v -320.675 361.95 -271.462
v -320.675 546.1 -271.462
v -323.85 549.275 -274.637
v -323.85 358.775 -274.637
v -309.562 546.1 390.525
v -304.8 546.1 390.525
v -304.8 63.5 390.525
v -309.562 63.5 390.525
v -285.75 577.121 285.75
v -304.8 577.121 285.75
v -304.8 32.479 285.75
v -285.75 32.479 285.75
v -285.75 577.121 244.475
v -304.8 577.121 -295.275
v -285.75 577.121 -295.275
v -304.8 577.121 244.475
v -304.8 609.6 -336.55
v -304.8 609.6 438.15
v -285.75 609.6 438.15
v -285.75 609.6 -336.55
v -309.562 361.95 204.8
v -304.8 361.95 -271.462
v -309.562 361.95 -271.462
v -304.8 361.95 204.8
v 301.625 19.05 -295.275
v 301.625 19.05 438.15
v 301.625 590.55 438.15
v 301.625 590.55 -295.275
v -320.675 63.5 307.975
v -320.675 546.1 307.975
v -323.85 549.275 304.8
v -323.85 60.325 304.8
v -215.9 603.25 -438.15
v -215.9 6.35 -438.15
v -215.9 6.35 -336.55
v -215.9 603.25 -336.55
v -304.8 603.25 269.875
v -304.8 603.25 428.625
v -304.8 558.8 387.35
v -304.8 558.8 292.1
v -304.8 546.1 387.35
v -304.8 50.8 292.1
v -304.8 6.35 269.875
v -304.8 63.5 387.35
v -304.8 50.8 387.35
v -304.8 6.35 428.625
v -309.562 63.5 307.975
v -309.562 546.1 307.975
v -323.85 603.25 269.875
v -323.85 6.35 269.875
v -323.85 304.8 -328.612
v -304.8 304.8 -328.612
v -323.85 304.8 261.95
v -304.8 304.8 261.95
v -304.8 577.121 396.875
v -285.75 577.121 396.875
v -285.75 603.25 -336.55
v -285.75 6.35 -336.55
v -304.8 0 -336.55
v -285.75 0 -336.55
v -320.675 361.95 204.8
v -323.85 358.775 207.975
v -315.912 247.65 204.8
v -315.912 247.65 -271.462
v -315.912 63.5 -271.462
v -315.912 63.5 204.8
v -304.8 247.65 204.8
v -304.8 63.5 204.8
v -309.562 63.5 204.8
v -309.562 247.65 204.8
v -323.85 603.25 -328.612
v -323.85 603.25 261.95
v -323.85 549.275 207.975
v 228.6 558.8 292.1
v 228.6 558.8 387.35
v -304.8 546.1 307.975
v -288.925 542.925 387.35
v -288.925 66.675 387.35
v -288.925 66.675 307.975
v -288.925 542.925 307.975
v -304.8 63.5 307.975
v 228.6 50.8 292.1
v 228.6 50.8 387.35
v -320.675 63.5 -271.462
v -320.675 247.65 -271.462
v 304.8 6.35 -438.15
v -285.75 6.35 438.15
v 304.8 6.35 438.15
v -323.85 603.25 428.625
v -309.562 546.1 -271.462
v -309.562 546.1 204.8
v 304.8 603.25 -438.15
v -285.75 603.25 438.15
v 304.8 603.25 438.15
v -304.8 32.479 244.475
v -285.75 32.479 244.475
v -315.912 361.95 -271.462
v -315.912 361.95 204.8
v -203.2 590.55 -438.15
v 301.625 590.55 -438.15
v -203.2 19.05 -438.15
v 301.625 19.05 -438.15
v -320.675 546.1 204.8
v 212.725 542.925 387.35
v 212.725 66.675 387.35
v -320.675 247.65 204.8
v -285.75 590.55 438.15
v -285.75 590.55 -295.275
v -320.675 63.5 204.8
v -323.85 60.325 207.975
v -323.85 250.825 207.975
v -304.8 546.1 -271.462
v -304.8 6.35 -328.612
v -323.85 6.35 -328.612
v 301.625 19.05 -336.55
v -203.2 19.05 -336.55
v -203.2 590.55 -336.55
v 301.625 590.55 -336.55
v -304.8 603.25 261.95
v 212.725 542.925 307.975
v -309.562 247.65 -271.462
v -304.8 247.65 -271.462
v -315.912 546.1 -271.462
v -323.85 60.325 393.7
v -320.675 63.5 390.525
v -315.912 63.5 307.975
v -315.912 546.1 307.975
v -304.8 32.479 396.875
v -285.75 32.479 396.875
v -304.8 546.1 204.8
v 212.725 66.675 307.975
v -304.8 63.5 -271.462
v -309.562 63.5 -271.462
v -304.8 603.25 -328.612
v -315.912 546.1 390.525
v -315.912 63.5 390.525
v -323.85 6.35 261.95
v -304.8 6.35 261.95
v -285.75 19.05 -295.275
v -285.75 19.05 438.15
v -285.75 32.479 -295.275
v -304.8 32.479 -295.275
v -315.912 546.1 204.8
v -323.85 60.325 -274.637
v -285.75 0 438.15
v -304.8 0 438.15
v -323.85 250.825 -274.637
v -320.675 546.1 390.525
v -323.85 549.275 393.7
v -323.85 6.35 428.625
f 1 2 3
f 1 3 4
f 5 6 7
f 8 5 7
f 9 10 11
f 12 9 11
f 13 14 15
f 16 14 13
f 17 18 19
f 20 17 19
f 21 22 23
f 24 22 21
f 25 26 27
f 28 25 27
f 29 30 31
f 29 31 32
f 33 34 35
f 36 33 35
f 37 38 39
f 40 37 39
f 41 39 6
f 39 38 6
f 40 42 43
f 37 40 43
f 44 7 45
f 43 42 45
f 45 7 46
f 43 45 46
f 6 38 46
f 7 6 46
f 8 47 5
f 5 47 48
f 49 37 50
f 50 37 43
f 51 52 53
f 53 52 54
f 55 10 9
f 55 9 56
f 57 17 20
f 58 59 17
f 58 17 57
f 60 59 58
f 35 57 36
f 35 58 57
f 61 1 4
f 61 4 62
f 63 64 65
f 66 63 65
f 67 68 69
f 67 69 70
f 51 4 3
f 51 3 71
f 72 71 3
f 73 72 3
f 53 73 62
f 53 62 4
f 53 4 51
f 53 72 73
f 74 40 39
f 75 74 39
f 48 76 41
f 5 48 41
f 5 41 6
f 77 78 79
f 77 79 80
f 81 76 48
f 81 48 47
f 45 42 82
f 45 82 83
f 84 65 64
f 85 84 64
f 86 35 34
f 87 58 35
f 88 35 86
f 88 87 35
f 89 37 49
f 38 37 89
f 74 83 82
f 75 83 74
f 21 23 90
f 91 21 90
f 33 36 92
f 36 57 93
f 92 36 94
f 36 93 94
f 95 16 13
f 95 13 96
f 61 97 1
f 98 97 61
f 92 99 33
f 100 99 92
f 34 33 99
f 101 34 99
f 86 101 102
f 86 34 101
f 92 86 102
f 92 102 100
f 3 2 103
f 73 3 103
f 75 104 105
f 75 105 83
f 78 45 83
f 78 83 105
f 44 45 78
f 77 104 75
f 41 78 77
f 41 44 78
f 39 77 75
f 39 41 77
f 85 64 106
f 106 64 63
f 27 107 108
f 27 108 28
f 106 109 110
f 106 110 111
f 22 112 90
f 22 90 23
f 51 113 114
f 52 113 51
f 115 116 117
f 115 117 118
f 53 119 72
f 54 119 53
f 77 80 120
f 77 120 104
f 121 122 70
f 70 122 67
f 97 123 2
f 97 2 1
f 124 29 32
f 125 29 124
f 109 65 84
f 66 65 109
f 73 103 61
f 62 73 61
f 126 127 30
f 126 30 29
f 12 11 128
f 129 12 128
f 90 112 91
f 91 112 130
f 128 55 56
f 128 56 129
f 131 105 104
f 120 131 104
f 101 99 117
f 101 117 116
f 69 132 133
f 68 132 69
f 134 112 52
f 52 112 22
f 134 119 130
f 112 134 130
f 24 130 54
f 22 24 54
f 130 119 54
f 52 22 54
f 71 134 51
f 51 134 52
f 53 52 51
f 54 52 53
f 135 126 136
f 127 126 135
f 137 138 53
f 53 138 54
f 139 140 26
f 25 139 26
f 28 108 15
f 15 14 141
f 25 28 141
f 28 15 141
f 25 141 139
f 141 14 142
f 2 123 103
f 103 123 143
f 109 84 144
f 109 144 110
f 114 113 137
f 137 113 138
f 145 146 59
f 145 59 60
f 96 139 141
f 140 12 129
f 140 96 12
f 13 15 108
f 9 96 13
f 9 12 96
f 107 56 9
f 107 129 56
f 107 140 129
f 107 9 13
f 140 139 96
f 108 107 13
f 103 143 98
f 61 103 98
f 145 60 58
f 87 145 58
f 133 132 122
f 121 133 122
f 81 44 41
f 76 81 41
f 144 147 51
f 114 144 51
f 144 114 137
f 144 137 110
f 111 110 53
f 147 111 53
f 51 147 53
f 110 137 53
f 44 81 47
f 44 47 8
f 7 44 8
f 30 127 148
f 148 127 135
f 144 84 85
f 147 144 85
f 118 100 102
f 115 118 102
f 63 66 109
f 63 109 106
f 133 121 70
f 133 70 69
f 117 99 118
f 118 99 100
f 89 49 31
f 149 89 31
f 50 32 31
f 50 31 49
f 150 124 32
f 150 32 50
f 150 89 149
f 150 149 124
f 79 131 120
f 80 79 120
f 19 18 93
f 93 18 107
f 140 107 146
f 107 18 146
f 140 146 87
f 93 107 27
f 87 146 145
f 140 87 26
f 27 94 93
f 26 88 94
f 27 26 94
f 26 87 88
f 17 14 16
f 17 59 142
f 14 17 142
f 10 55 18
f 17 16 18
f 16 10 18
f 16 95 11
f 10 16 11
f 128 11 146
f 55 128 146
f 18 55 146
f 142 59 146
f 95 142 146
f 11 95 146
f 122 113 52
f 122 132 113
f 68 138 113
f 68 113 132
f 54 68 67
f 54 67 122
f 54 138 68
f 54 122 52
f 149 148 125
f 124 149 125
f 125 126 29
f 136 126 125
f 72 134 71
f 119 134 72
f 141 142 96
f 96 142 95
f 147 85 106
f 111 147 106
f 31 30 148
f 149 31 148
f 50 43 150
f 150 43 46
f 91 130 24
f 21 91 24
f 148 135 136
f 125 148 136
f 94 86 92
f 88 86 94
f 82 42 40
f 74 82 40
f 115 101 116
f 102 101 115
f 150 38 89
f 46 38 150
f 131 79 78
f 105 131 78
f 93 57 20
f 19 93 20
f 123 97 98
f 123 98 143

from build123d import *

# Parameters (mm, degrees)
F0_W          = 609.6
F0_H          = 876.3
F1_DEPTH      = 609.6
F2_W          = 88.9
F2_H          = 101.6
F3_DEPTH      = 609.601
F4_W          = 544.6426229508
F4_H          = 692.15
F5_DEPTH      = 19.05
F6_W          = 590.55
F6_H          = 6.35
F7_DEPTH      = 876.301
F8_W          = 587.375
F8_H          = 571.5
F9_DEPTH      = 733.425
F10_W         = 544.6426229508
F10_H         = 41.275
F11_DEPTH     = 19.05
F12_W         = 298.45
F12_H         = 590.5627
F12_W_2       = 184.15
F12_H_2       = 476.2627
F13_DEPTH     = 19.05
F14_W         = 6.35
F14_H         = 184.15
F15_DEPTH     = 476.2627
F16_SIZE      = 3.175
F17_W         = 596.9
F17_H         = 158.75
F17_W_2       = 482.6
F17_H_2       = 82.55
F18_DEPTH     = 19.05
F19_W         = 6.35
F19_H         = 482.6
F20_DEPTH     = 82.55
F21_SIZE      = 3.175
F22_W         = 504.825
F22_H         = 571.5
F23_DEPTH     = 101.6
F24_W         = 508
F24_H         = 95.25
F25_DEPTH     = 533.4
F26_T         = 15.875
F26_T3_DEPTH  = 37.249261314
F26_T5_DEPTH  = 37.249261314
F26_T7_DEPTH  = 37.249261314
F26_T9_DEPTH  = 37.249261314
F26_T11_DEPTH = 36.5125
F26_T13_DEPTH = 514.35
F26_T15_DEPTH = 114.3
F26_T17_DEPTH = 127
F26_T19_DEPTH = 539.75
F26_T21_DEPTH = 111.125
F26_T23_DEPTH = 36.5125


# Not quite as in the source:
# - a shell that OpenCascade refuses in one call is made with other operations: the cavity is built on its own and cut out


with BuildPart() as f1:
    # F0 (on Front) → F1 (new body)
    with BuildSketch(Plane.XZ):
        Rectangle(F0_W, F0_H)
    extrude(amount=-F1_DEPTH)

    # F2 (on face) → F3 (cut, through all)
    with BuildSketch(Plane.XZ):
        with Locations((-260.35, -387.35)):
            Rectangle(F2_W, F2_H)
    extrude(amount=-F3_DEPTH, mode=Mode.SUBTRACT)

    # F4 (on face) → F5 (cut)
    with BuildSketch(Plane(origin=(-304.8, 0, 0), x_dir=(0, -1, 0), z_dir=(-1, 0, 0))):
        with Locations((-304.8, 50.8)):
            Rectangle(F4_W, F4_H)
    extrude(amount=-F5_DEPTH, mode=Mode.SUBTRACT)

    # F6 (on face) → F7 (cut, through all)
    with BuildSketch(Plane.XY.offset(438.15)):
        with Locations((9.525, 606.425)):
            Rectangle(F6_W, F6_H)
        with Locations((9.525, 3.175)):
            Rectangle(F6_W, F6_H)
    extrude(amount=-F7_DEPTH, mode=Mode.SUBTRACT)

    # F8 (on face) → F9 (cut, through all)
    with BuildSketch(Plane.XY.offset(438.15)):
        with Locations((7.9375, 304.8)):
            Rectangle(F8_W, F8_H)
    extrude(amount=-F9_DEPTH, mode=Mode.SUBTRACT)

    # F10 (on face) → F11 (join, through all)
    with BuildSketch(Plane(origin=(-304.8, 0, 0), x_dir=(0, -1, 0), z_dir=(-1, 0, 0))):
        with Locations((-304.8, 265.1125)):
            Rectangle(F10_W, F10_H)
    extrude(amount=-F11_DEPTH)

    # F22 (on face) → F23 (cut)
    with BuildSketch(Plane(origin=(0, 0, -438.15), x_dir=(1, 0, 0), z_dir=(0, 0, -1))):
        with Locations((49.2125, -304.8)):
            Rectangle(F22_W, F22_H)
    extrude(amount=-F23_DEPTH, mode=Mode.SUBTRACT)


with BuildPart() as f13:
    # F12 (on face) → F13 (new body)
    with BuildSketch(Plane(origin=(-304.8, 0, 0), x_dir=(0, -1, 0), z_dir=(-1, 0, 0))):
        with Locations((-454.025, -33.33115)):
            Rectangle(F12_W, F12_H)
        with Locations((-454.025, -33.33115)):
            Rectangle(F12_W_2, F12_H_2, mode=Mode.SUBTRACT)
    extrude(amount=F13_DEPTH)

    # F14 (on face) → F15 (join, through all)
    with BuildSketch(Plane.XY.offset(-271.4625)):
        with Locations((-312.7375, 454.025)):
            Rectangle(F14_W, F14_H)
    extrude(amount=F15_DEPTH)

    # F16
    f16_edges = [f13.edges().sort_by_distance(p)[0] for p in [
        (-323.85, 546.1, -33.33115),
        (-323.85, 454.025, -271.4625),
        (-323.85, 361.95, -33.33115),
        (-323.85, 454.025, 204.8002),
    ]]
    chamfer(f16_edges, length=F16_SIZE)


with BuildPart() as f18:
    # F17 (on face) → F18 (new body)
    with BuildSketch(Plane(origin=(-304.8, 0, 0), x_dir=(0, -1, 0), z_dir=(-1, 0, 0))):
        with Locations((-304.8, 349.25)):
            Rectangle(F17_W, F17_H)
        with Locations((-304.8, 349.25)):
            Rectangle(F17_W_2, F17_H_2, mode=Mode.SUBTRACT)
    extrude(amount=F18_DEPTH)

    # F19 (on face) → F20 (join, through all)
    with BuildSketch(Plane.XY.offset(307.975)):
        with Locations((-312.7375, 304.8)):
            Rectangle(F19_W, F19_H)
    extrude(amount=F20_DEPTH)

    # F21
    f21_edges = [f18.edges().sort_by_distance(p)[0] for p in [
        (-323.85, 304.8, 307.975),
        (-323.85, 546.1, 349.25),
        (-323.85, 304.8, 390.525),
        (-323.85, 63.5, 349.25),
    ]]
    chamfer(f21_edges, length=F21_SIZE)

    # F24 (on face) → F25 (join)
    with BuildSketch(Plane.YZ.offset(-304.8)):
        with Locations((304.8, 339.725)):
            Rectangle(F24_W, F24_H)
    extrude(amount=F25_DEPTH)

    # F26: shell of thickness 15.875, made by hand


with BuildPart() as f26_core1:
    # F26_t2: copy of F18
    add(f18.part)

    # the walls: a layer under each face that stays
    f26_faces = [f26_core1.faces().sort_by_distance(p)[0] for p in [
        (-323.85, 503.7666666667, 296.3333333333),
        (-322.2625, 304.8, 306.3875),
        (-322.2625, 61.9125, 349.25),
        (-322.2625, 547.6875, 349.25),
        (-322.2625, 304.8, 392.1125),
        (-314.325, 304.8, 428.625),
        (-314.325, 603.25, 349.25),
        (-314.325, 304.8, 269.875),
        (-314.325, 6.35, 349.25),
        (-318.29375, 304.8, 307.975),
        (-318.29375, 63.5, 349.25),
        (-318.29375, 546.1, 349.25),
        (-318.29375, 304.8, 390.525),
        (-304.8, 503.7666666667, 402.1666666667),
        (-315.9125, 304.8, 349.25),
        (-38.1, 558.8, 339.725),
        (-38.1, 304.8, 292.1),
        (-38.1, 50.8, 339.725),
        (-307.18125, 63.5, 349.25),
        (-307.18125, 304.8, 390.525),
        (-307.18125, 546.1, 349.25),
        (-304.8, 304.8, 347.6625),
        (228.6, 304.8, 339.725),
        (-307.18125, 304.8, 307.975),
        (-309.5625, 304.8, 349.25),
    ]]
    thicken(f26_faces, amount=-F26_T, mode=Mode.SUBTRACT)

    # F26_s4 → F26_t3 (cut)
    with BuildSketch(Plane(origin=(4.5928978099, 4.5928978099, 4.5928978099), x_dir=(-0.7071067812, 0.7071067812, 0), z_dir=(0.5773502692, 0.5773502692, 0.5773502692))):
        Polygon((271.8908726623, 356.5892701441), (263.7152476623, 342.7036353262), (255.7777476623, 347.2863530879), (255.7777476623, 356.4517886113), align=None)
    extrude(amount=F26_T3_DEPTH, mode=Mode.SUBTRACT)

    # F26_s6 → F26_t5 (cut)
    with BuildSketch(Plane(origin=(-198.6071021901, 198.60710219, -198.6071021901), x_dir=(0.7071067812, 0.7071067812, 0), z_dir=(0.5773502692, -0.5773502692, 0.5773502692))):
        Polygon((159.161421149, 605.4574280109), (167.337046149, 591.571793193), (175.274546149, 596.1545109546), (175.274546149, 605.319946478), align=None)
    extrude(amount=F26_T5_DEPTH, mode=Mode.SUBTRACT)

    # F26_s8 → F26_t7 (cut)
    with BuildSketch(Plane(origin=(-228.2404355234, -228.2404355234, 228.2404355234), x_dir=(-0.7071067812, 0.7071067812, 0), z_dir=(0.5773502692, 0.5773502692, -0.5773502692))):
        Polygon((271.8908726623, 213.7335916339), (255.7777476623, 213.8710731668), (255.7777476623, 223.0365086901), (263.7152476623, 227.6192264518), align=None)
    extrude(amount=F26_T7_DEPTH, mode=Mode.SUBTRACT)

    # F26_s10 → F26_t9 (cut)
    with BuildSketch(Plane(origin=(-431.4404355234, 431.4404355234, 431.4404355234), x_dir=(0.7071067812, 0.7071067812, 0), z_dir=(0.5773502692, -0.5773502692, -0.5773502692))):
        Polygon((159.161421149, -35.1345662329), (175.274546149, -34.9970847), (175.274546149, -25.8316491766), (167.337046149, -21.2489314149), align=None)
    extrude(amount=F26_T9_DEPTH, mode=Mode.SUBTRACT)

    # F26_s12 → F26_t11 (cut)
    with BuildSketch(Plane.YZ.offset(-336.55)):
        Polygon((545.94125, 308.13375), (546.1, 292.1), (561.975, 292.1), (561.975, 307.975), align=None)
        Polygon((63.65875, 308.13375), (63.5, 292.1), (47.625, 292.1), (47.625, 307.975), align=None)
        Polygon((63.65875, 390.36625), (47.625, 390.525), (47.625, 406.4), (63.5, 406.4), align=None)
        Polygon((545.94125, 390.36625), (561.975, 390.525), (561.975, 406.4), (546.1, 406.4), align=None)
    extrude(amount=F26_T11_DEPTH, mode=Mode.SUBTRACT)

    # F26_s14 → F26_t13 (cut)
    with BuildSketch(Plane.XZ.offset(-561.975)):
        Polygon((-316.07125, 308.13375), (-315.9125, 292.1), (-300.0375, 292.1), (-300.0375, 307.975), align=None)
        Polygon((-316.07125, 390.36625), (-315.9125, 406.4), (-300.0375, 406.4), (-300.0375, 390.525), align=None)
        Polygon((-309.40375, 390.36625), (-309.5625, 406.4), (-325.4375, 406.4), (-325.4375, 390.525), align=None)
        Polygon((-304.95875, 308.13375), (-288.925, 307.975), (-288.925, 292.1), (-304.8, 292.1), align=None)
        Polygon((-309.40375, 308.13375), (-309.5625, 292.1), (-325.4375, 292.1), (-325.4375, 307.975), align=None)
    extrude(amount=F26_T13_DEPTH, mode=Mode.SUBTRACT)

    # F26_s16 → F26_t15 (cut)
    with BuildSketch(Plane.XY.offset(292.1)):
        Polygon((-316.07125, 63.65875), (-315.9125, 47.625), (-300.0375, 47.625), (-300.0375, 63.5), align=None)
        Polygon((-316.07125, 545.94125), (-315.9125, 561.975), (-300.0375, 561.975), (-300.0375, 546.1), align=None)
        Polygon((-309.40375, 63.65875), (-309.5625, 47.625), (-325.4375, 47.625), (-325.4375, 63.5), align=None)
        Polygon((-309.40375, 545.94125), (-309.5625, 561.975), (-325.4375, 561.975), (-325.4375, 546.1), align=None)
    extrude(amount=F26_T15_DEPTH, mode=Mode.SUBTRACT)

    # F26_s18 → F26_t17 (cut)
    with BuildSketch(Plane.XY.offset(276.225)):
        Polygon((-304.64125, 558.95875), (-320.675, 558.8), (-320.675, 542.925), (-304.8, 542.925), align=None)
        Polygon((-304.64125, 50.64125), (-320.675, 50.8), (-320.675, 66.675), (-304.8, 66.675), align=None)
    extrude(amount=F26_T17_DEPTH, mode=Mode.SUBTRACT)

    # F26_s20 → F26_t19 (cut)
    with BuildSketch(Plane.XZ.offset(-574.675)):
        Polygon((-304.64125, 291.94125), (-320.675, 292.1), (-320.675, 307.975), (-304.8, 307.975), align=None)
    extrude(amount=F26_T19_DEPTH, mode=Mode.SUBTRACT)

    # F26_s22 → F26_t21 (cut)
    with BuildSketch(Plane.XY.offset(292.1)):
        Polygon((-304.95875, 63.65875), (-304.8, 47.625), (-288.925, 47.625), (-288.925, 63.5), align=None)
        Polygon((-304.95875, 545.94125), (-304.8, 561.975), (-288.925, 561.975), (-288.925, 546.1), align=None)
    extrude(amount=F26_T21_DEPTH, mode=Mode.SUBTRACT)

    # F26_s24 → F26_t23 (cut)
    with BuildSketch(Plane.YZ.offset(-325.4375)):
        Polygon((63.65875, 308.13375), (47.625, 307.975), (47.625, 292.1), (63.5, 292.1), align=None)
        Polygon((63.65875, 390.36625), (47.625, 390.525), (47.625, 406.4), (63.5, 406.4), align=None)
        Polygon((545.94125, 390.36625), (546.1, 406.4), (561.975, 406.4), (561.975, 390.525), align=None)
        Polygon((545.94125, 308.13375), (561.975, 307.975), (561.975, 292.1), (546.1, 292.1), align=None)
    extrude(amount=F26_T23_DEPTH, mode=Mode.SUBTRACT)


with BuildPart() as f18_1:
    add(f18.part)

    # what is left inside the walls is the cavity
    f26_cavity = [f26_core1.part.solids().sort_by_distance(p)[0] for p in [
        (45.508333, 304.8, 308.13375),
    ]]
    add(f26_cavity, mode=Mode.SUBTRACT)


with BuildPart() as f27_1:
    # F27: instance of F13
    add(f13.part.mirror(Plane(origin=(-314.325, 304.8, -33.33115), x_dir=(1, 0, 0), z_dir=(0, -1, 0))))


solid = Compound([f1.part, f13.part, f18_1.part, f27_1.part])
